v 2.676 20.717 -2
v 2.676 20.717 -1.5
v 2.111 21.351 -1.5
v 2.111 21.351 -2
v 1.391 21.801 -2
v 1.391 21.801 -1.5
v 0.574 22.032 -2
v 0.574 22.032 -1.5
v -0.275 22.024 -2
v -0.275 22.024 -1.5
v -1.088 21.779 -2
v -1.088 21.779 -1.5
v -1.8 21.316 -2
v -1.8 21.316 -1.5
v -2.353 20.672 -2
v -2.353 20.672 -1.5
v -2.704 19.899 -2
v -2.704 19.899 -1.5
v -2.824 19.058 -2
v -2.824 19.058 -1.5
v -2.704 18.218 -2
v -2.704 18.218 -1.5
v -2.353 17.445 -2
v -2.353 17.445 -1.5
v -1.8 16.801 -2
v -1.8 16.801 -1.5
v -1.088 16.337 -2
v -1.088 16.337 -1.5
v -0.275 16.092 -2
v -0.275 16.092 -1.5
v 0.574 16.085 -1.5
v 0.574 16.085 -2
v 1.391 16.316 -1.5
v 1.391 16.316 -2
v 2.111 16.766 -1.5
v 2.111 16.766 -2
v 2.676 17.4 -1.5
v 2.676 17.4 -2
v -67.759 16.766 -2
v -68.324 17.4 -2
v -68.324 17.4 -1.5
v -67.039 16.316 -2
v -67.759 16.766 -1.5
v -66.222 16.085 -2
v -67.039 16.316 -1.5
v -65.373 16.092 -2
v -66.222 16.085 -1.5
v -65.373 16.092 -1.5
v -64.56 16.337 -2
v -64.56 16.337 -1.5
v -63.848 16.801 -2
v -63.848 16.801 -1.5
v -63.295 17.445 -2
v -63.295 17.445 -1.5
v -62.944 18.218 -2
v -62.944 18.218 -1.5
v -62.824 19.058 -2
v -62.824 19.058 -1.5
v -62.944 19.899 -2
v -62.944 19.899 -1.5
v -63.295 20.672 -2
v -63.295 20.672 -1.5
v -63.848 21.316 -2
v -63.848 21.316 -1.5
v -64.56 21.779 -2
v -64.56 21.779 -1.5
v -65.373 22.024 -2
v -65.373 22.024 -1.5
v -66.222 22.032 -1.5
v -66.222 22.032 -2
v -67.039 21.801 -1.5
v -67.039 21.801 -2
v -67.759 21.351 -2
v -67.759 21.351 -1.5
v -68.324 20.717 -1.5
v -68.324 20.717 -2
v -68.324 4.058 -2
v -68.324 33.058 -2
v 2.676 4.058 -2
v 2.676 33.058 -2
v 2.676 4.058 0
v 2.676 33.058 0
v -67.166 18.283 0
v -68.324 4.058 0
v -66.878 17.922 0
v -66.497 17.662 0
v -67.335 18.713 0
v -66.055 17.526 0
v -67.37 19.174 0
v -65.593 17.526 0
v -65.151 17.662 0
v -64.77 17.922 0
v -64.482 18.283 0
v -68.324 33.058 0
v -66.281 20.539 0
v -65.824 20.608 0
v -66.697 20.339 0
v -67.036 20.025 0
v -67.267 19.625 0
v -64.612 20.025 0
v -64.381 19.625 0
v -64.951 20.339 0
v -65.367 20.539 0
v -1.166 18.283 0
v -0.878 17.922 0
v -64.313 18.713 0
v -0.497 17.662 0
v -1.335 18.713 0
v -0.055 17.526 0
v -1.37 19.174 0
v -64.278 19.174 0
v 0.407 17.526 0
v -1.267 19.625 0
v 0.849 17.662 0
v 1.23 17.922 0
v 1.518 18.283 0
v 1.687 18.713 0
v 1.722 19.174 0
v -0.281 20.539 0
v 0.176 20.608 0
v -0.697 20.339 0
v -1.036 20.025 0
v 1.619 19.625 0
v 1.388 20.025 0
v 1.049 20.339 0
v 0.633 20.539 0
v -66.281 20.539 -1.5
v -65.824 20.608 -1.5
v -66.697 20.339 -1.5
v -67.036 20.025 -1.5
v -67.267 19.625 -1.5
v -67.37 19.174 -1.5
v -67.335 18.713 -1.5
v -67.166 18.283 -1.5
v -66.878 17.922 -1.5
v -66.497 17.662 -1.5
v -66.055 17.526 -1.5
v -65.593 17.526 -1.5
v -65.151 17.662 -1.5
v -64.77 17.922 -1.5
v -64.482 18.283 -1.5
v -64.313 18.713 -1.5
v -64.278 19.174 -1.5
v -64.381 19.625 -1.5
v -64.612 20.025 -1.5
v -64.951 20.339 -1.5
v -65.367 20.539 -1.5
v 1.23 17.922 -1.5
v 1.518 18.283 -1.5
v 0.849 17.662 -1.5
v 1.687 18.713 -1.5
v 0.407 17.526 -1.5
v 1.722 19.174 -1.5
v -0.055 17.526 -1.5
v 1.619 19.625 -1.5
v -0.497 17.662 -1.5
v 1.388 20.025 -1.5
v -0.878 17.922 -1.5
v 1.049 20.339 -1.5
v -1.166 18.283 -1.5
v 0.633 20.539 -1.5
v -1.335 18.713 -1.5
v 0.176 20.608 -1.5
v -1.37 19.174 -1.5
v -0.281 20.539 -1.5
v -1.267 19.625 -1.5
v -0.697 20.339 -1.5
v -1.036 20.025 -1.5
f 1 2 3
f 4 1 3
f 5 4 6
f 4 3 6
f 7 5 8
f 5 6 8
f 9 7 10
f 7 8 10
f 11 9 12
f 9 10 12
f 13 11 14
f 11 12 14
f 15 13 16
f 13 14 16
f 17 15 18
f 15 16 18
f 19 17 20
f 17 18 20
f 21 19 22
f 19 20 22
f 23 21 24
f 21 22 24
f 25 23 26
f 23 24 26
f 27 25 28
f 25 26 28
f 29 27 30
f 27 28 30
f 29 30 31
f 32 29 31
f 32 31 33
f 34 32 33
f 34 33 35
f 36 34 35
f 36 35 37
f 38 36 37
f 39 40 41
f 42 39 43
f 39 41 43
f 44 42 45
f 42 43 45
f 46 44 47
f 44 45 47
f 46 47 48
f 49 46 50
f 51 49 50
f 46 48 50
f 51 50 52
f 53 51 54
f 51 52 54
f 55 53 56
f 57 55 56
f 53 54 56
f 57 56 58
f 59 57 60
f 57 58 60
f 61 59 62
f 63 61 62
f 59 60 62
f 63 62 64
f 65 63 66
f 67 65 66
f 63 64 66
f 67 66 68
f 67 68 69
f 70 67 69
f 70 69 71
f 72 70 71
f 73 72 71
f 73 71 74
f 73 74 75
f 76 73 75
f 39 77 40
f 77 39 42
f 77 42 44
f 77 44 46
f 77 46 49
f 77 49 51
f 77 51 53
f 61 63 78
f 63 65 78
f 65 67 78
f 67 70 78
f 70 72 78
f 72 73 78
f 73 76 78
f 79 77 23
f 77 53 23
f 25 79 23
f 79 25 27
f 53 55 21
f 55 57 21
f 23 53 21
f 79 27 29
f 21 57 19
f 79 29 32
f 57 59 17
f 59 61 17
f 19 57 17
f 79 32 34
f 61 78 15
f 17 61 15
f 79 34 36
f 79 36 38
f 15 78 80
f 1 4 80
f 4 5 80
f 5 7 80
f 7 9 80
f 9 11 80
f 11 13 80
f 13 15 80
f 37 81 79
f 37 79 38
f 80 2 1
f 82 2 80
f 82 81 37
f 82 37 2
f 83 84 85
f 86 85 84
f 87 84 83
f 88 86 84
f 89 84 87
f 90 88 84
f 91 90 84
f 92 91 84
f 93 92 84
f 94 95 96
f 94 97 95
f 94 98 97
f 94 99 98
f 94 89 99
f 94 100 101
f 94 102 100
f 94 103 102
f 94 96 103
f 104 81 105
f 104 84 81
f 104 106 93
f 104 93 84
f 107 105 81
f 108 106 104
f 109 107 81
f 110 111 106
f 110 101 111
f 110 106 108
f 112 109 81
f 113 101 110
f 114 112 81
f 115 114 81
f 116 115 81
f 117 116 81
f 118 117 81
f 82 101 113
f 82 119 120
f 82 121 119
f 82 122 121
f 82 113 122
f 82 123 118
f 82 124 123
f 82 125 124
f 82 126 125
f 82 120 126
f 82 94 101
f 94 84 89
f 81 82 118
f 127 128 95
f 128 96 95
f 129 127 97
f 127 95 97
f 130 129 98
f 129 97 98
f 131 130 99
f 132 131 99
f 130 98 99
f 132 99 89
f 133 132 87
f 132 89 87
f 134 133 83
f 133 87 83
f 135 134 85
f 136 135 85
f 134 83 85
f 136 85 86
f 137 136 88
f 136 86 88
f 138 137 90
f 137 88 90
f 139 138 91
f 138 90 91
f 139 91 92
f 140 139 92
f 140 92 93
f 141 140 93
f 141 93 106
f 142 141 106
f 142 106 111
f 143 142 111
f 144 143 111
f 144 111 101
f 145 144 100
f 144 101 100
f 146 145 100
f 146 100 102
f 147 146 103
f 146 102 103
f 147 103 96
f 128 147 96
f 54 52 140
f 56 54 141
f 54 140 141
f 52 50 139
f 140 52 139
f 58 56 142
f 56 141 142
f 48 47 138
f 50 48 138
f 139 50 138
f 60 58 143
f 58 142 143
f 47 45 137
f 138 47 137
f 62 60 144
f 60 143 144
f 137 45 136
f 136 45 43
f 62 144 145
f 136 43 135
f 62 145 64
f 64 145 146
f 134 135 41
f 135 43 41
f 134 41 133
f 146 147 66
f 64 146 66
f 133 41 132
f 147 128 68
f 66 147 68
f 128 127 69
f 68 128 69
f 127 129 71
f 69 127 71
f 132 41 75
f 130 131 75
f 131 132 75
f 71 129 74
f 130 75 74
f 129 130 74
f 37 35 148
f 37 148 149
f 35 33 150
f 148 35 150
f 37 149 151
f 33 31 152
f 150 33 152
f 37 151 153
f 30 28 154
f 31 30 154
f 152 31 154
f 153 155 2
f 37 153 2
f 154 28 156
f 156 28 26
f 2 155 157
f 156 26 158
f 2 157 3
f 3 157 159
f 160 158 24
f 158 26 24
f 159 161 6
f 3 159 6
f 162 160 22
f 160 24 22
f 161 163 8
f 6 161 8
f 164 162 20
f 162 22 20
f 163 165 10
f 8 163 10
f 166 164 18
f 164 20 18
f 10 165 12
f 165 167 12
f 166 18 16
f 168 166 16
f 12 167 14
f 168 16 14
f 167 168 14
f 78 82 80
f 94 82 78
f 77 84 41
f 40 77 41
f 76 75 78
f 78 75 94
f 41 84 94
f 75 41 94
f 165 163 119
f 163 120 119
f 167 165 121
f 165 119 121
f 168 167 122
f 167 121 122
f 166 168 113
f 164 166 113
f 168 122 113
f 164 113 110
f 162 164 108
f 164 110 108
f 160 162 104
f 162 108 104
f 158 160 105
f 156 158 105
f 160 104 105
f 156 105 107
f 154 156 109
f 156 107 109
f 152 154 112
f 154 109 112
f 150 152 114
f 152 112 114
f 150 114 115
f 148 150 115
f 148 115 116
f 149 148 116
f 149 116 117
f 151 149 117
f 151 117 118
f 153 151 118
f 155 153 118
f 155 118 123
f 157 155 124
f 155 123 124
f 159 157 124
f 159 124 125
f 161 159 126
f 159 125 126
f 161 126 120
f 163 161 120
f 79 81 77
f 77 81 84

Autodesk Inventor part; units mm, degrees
ref_plane "YZ Plane" through (0, 0, 0) normal (1, 0, 0) x (0, 1, 0)
ref_plane "XZ Plane" through (0, 0, 0) normal (0, 1, 0) x (-1, 0, 0)
ref_plane "XY Plane" through (0, 0, 0) normal (0, 0, 1) x (1, 0, 0)
sketch "Sketch3" plane through (0, 0, 0) normal (0, 0, 1) x (1, 0, 0)
  line L0 (2.676, 4.0583) -> (2.676, 33.0583) projected
  line L1 (2.676, 4.0583) -> (-2.324, 4.0583) projected
  line L2 (-2.324, 4.0583) -> (-2.324, 33.0583) projected
  line L3 (2.676, 33.0583) -> (-2.324, 33.0583) projected
  line L4 (-68.324, 4.0583) -> (-68.324, 29.5583) projected
  line L5 (-68.324, 33.0583) -> (-63.324, 33.0583) projected
  line L6 (-63.324, 4.0583) -> (-63.324, 33.0583) projected
  line L7 (-68.324, 4.0583) -> (-63.324, 4.0583) projected
  line L8 (2.676, 33.0583) -> (-68.324, 33.0583)
  line L9 (-68.324, 33.0583) -> (-68.324, 4.0583)
  line L10 (-68.324, 4.0583) -> (2.676, 4.0583)
  line L11 (2.676, 4.0583) -> (2.676, 33.0583)
  circle A0 centre (0.176, 19.0583) radius 1.75 projected
  line L12 (-68.324, 29.5583) -> (-68.324, 33.0583) projected
  circle A1 centre (-65.824, 19.0583) radius 1.75 projected
  point P0 (0, 0)
extrude "Extrusion2" add sketch "Sketch3" against normal blind 2 contours L1 L2 L3 L0 | L10 L6 L8 L2 | L7 L4 L9 L5 L6 | A0 | A1
sketch "Sketch4" plane through (0, 0, -2) normal (0, 0, -1) x (-1, 0, 0)
  circle A0 centre (-0.176, 19.0583) radius 1.75 projected
  circle A1 centre (65.824, 19.0583) radius 1.75 projected
  point P0 (0, 0)
hole "Hole2" at (0.176, 19.0583, -2) at (-65.824, 19.0583, -2) direction (0, 0, 1) diameter 3.1 end through all counterbore diameter 6 counterbore depth 0.5 clearance for "Countersunk Flat Head Screw ISO 2009/7046" size "M2.5" standard "ISO"
properties part number "back" material "ABS Plastic"
